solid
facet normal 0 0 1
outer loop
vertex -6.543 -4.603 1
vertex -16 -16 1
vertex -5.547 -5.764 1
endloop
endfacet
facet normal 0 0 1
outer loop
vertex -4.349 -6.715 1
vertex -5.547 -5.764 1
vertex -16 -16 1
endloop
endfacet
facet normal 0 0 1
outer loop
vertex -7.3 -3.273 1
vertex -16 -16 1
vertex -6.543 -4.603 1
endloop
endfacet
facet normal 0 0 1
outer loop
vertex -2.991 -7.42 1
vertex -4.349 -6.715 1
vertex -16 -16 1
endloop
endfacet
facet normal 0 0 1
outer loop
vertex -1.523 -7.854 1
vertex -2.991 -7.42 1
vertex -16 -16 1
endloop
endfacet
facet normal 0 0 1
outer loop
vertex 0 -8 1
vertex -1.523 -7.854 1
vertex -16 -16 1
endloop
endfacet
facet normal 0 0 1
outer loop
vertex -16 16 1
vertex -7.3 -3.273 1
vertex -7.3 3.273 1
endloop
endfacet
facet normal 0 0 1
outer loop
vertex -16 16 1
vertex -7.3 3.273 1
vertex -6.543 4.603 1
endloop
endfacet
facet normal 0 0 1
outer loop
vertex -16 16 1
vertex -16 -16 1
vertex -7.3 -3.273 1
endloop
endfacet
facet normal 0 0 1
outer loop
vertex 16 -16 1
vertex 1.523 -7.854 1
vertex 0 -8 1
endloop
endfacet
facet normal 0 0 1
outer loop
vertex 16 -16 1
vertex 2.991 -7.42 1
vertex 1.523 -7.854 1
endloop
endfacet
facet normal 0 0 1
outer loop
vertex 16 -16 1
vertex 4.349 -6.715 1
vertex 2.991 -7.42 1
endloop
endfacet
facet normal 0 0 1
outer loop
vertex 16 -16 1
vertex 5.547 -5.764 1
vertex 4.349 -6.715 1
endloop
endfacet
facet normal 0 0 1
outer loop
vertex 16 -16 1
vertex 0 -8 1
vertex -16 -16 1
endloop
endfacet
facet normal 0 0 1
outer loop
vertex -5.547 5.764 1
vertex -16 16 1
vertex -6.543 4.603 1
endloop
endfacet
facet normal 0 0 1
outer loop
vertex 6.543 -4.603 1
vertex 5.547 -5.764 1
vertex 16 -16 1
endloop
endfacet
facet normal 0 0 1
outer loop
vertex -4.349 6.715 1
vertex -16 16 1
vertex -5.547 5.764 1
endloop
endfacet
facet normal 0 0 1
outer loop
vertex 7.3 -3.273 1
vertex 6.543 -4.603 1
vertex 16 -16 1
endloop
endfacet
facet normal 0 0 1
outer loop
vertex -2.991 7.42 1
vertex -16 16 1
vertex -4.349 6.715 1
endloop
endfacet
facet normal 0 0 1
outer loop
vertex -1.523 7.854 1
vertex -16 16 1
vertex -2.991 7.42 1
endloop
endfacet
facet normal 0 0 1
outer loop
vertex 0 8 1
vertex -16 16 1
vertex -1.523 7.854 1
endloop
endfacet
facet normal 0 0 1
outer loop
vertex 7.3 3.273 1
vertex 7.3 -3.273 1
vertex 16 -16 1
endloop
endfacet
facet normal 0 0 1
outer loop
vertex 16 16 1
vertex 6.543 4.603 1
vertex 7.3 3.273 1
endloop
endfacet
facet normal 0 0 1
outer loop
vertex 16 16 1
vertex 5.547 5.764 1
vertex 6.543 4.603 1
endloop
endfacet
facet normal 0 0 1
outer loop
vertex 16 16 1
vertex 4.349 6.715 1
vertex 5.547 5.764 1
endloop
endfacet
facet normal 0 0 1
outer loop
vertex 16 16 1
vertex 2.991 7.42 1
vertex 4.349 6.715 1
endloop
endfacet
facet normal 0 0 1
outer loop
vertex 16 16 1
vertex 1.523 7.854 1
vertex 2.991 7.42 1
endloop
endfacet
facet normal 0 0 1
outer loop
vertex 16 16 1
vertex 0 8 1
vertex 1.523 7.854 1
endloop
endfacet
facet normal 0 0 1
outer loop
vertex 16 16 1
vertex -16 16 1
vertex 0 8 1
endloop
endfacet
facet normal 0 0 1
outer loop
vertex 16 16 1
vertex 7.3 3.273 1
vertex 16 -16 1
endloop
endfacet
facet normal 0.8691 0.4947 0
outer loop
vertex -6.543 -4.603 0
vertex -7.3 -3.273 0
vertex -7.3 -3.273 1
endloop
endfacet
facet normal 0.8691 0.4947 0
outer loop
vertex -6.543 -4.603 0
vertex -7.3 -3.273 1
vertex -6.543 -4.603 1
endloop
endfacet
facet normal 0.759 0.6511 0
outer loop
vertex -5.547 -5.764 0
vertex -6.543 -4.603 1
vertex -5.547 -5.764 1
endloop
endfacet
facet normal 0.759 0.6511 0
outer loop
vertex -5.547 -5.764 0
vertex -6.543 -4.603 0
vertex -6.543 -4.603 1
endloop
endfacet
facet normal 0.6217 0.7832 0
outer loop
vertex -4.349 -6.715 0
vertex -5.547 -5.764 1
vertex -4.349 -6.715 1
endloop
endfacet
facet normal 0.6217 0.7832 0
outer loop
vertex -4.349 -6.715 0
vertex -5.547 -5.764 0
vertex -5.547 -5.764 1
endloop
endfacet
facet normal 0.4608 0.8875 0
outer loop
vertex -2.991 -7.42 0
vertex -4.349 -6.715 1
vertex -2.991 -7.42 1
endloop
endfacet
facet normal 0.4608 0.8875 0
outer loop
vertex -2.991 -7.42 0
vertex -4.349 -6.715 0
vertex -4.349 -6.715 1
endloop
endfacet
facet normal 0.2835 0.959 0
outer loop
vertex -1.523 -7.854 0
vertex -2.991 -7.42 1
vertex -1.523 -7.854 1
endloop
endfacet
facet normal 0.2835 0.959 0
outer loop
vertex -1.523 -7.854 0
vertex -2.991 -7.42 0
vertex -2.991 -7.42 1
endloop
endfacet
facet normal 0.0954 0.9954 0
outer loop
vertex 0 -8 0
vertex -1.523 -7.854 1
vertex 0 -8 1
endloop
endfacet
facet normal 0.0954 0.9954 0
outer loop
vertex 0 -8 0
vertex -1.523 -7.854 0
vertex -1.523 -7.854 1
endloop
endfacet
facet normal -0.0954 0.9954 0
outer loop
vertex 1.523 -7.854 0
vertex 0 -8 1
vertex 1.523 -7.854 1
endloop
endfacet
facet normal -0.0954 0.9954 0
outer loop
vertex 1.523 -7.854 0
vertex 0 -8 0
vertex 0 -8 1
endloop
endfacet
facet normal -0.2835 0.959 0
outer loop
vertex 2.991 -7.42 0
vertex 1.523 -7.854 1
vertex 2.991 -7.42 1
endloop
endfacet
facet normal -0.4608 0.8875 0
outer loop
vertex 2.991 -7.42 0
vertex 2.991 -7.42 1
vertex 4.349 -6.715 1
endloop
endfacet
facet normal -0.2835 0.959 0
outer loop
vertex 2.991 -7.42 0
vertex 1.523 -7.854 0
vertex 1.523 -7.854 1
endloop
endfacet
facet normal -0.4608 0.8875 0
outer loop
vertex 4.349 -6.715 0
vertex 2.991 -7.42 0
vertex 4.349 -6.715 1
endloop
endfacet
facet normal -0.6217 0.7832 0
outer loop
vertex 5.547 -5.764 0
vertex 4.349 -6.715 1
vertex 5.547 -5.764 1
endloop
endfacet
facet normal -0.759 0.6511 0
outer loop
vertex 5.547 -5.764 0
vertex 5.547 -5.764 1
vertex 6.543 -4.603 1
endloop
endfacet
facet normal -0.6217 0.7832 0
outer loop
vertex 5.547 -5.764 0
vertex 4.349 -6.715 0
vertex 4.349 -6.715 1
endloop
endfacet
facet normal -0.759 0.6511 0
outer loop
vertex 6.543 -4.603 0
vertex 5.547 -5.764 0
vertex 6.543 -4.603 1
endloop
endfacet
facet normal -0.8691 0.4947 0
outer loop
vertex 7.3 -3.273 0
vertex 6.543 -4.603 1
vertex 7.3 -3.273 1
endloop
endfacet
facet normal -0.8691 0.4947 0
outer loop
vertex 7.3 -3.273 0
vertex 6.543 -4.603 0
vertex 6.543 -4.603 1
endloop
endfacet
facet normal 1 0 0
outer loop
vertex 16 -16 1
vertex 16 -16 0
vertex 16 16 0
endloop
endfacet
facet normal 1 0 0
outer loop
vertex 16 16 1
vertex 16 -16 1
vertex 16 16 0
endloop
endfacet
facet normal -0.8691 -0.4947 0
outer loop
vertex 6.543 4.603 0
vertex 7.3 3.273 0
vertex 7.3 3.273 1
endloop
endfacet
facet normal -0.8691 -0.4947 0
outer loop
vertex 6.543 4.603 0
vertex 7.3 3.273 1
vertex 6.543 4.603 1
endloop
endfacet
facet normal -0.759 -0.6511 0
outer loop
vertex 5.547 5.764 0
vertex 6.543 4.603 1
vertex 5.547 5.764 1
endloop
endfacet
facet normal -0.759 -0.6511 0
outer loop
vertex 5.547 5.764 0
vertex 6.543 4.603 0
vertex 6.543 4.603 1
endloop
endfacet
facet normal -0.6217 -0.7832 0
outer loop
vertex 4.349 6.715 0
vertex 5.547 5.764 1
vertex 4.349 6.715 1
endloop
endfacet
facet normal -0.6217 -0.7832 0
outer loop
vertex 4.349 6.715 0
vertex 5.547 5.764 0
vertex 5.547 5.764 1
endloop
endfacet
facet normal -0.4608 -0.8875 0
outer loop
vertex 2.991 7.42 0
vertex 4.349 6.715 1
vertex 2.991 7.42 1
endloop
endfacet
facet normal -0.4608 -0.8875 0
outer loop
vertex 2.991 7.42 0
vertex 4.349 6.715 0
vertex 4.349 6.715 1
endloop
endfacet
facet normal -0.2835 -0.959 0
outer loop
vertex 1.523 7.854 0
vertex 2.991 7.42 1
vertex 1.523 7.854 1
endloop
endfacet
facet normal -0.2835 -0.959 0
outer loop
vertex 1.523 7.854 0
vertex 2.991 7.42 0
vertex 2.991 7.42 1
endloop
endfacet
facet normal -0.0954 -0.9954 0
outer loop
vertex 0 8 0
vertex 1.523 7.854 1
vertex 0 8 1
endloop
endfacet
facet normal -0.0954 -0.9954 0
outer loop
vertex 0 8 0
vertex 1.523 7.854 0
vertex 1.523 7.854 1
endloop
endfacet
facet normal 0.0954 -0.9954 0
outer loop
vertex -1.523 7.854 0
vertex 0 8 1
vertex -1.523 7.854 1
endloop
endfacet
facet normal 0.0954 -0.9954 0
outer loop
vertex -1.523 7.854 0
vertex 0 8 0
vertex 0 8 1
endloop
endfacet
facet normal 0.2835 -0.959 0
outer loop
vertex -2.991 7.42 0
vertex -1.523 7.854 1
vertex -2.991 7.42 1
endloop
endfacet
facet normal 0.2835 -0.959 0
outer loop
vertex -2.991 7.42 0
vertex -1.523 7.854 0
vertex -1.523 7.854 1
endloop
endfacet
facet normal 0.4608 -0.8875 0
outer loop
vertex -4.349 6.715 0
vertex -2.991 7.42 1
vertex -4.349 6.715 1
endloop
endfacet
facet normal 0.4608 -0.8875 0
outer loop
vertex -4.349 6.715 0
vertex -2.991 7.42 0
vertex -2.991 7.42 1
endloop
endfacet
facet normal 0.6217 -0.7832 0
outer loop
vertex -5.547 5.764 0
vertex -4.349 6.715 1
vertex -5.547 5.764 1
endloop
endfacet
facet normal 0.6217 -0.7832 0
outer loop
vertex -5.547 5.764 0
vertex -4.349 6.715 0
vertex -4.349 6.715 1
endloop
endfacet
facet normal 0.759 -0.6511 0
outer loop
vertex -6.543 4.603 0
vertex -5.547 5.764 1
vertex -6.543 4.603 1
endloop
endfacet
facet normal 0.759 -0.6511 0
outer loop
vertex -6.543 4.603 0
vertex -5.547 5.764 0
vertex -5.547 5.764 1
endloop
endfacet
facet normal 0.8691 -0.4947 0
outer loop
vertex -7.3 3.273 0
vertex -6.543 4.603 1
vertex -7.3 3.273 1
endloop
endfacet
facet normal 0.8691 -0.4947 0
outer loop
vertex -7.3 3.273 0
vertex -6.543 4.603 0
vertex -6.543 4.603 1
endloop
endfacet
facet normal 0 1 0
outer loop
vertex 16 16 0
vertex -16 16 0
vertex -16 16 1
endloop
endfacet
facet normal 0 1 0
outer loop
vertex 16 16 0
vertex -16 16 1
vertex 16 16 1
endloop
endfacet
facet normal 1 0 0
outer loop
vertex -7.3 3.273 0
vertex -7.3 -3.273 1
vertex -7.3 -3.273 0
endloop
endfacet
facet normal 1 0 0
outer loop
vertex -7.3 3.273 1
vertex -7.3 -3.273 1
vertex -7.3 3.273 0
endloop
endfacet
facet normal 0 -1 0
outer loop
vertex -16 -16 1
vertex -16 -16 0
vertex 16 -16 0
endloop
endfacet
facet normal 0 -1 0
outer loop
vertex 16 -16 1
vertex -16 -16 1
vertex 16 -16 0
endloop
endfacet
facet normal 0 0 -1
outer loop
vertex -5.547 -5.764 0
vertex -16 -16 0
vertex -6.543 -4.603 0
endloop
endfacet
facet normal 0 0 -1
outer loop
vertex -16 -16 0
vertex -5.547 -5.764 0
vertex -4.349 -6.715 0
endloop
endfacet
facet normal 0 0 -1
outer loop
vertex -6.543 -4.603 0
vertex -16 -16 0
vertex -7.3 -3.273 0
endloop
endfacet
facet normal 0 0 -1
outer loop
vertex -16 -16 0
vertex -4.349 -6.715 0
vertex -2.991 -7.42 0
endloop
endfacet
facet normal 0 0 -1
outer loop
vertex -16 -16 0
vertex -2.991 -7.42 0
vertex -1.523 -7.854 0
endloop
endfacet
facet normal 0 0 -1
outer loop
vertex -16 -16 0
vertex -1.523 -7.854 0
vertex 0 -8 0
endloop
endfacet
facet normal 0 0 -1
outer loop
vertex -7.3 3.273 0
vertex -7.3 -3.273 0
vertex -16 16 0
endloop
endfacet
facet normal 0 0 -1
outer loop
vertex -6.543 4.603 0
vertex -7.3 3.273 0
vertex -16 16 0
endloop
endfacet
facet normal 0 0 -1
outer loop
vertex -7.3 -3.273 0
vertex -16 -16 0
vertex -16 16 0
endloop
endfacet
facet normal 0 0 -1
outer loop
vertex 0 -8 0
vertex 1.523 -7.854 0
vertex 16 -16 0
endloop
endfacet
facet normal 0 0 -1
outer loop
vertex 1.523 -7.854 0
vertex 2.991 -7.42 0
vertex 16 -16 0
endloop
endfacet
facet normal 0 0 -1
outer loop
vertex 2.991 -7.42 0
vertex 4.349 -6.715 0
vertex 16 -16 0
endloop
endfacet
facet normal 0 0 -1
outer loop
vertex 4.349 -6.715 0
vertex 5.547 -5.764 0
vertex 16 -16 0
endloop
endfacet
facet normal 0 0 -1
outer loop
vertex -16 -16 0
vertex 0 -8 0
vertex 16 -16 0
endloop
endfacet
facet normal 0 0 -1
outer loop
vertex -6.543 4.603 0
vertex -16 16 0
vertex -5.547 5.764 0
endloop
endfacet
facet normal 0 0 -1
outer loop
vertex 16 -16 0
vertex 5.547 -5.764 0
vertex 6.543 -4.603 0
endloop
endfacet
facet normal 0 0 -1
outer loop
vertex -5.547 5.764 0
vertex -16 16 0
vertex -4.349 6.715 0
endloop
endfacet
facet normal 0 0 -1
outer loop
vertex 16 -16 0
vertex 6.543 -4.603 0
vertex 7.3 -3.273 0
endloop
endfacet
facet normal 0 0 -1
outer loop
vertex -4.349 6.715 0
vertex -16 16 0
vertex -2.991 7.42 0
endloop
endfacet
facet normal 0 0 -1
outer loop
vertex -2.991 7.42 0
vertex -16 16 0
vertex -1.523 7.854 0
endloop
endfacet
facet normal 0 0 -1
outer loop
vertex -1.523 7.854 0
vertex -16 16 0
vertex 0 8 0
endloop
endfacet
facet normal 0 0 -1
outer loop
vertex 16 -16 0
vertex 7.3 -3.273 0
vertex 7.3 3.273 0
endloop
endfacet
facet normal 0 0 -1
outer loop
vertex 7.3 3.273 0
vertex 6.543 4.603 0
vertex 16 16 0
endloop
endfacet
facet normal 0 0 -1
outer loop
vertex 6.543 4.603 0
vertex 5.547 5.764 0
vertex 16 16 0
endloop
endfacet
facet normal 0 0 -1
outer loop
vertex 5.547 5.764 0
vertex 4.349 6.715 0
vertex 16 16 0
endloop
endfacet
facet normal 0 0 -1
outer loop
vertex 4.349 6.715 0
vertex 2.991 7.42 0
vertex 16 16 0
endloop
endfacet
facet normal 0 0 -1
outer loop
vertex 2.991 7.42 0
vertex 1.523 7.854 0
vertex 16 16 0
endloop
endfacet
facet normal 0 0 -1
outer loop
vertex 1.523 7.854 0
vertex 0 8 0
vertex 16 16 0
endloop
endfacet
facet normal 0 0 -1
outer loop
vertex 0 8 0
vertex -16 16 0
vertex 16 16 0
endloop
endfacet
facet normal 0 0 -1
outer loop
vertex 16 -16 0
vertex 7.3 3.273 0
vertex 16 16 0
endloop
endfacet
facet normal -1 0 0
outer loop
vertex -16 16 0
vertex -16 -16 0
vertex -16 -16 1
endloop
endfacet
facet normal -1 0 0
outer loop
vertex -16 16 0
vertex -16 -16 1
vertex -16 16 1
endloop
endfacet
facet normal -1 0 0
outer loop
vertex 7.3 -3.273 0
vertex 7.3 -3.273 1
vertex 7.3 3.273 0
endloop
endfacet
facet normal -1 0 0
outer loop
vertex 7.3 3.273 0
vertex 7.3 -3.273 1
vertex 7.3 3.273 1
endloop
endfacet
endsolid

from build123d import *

# Parameters (mm, degrees)
SKETCH_W     = 32
SKETCH_H     = 32
SKETCH_R     = 8
PAD_DEPTH    = 1
SKETCH001_W  = 2
SKETCH001_H  = 8
PAD001_DEPTH = 1


with BuildPart() as part:
    # Sketch → Pad (new body)
    with BuildSketch(Plane.XY):
        Rectangle(SKETCH_W, SKETCH_H)
        Circle(SKETCH_R, mode=Mode.SUBTRACT)
    extrude(amount=PAD_DEPTH)

    # Sketch001 (on Face7 of Pad) → Pad001 (join)
    with BuildSketch(Plane.XY.offset(1)):
        with Locations((-8.3, 0)):
            Rectangle(SKETCH001_W, SKETCH001_H)
        with Locations((8.3, 0)):
            Rectangle(SKETCH001_W, SKETCH001_H)
    extrude(amount=-PAD001_DEPTH)


solid = part.part
